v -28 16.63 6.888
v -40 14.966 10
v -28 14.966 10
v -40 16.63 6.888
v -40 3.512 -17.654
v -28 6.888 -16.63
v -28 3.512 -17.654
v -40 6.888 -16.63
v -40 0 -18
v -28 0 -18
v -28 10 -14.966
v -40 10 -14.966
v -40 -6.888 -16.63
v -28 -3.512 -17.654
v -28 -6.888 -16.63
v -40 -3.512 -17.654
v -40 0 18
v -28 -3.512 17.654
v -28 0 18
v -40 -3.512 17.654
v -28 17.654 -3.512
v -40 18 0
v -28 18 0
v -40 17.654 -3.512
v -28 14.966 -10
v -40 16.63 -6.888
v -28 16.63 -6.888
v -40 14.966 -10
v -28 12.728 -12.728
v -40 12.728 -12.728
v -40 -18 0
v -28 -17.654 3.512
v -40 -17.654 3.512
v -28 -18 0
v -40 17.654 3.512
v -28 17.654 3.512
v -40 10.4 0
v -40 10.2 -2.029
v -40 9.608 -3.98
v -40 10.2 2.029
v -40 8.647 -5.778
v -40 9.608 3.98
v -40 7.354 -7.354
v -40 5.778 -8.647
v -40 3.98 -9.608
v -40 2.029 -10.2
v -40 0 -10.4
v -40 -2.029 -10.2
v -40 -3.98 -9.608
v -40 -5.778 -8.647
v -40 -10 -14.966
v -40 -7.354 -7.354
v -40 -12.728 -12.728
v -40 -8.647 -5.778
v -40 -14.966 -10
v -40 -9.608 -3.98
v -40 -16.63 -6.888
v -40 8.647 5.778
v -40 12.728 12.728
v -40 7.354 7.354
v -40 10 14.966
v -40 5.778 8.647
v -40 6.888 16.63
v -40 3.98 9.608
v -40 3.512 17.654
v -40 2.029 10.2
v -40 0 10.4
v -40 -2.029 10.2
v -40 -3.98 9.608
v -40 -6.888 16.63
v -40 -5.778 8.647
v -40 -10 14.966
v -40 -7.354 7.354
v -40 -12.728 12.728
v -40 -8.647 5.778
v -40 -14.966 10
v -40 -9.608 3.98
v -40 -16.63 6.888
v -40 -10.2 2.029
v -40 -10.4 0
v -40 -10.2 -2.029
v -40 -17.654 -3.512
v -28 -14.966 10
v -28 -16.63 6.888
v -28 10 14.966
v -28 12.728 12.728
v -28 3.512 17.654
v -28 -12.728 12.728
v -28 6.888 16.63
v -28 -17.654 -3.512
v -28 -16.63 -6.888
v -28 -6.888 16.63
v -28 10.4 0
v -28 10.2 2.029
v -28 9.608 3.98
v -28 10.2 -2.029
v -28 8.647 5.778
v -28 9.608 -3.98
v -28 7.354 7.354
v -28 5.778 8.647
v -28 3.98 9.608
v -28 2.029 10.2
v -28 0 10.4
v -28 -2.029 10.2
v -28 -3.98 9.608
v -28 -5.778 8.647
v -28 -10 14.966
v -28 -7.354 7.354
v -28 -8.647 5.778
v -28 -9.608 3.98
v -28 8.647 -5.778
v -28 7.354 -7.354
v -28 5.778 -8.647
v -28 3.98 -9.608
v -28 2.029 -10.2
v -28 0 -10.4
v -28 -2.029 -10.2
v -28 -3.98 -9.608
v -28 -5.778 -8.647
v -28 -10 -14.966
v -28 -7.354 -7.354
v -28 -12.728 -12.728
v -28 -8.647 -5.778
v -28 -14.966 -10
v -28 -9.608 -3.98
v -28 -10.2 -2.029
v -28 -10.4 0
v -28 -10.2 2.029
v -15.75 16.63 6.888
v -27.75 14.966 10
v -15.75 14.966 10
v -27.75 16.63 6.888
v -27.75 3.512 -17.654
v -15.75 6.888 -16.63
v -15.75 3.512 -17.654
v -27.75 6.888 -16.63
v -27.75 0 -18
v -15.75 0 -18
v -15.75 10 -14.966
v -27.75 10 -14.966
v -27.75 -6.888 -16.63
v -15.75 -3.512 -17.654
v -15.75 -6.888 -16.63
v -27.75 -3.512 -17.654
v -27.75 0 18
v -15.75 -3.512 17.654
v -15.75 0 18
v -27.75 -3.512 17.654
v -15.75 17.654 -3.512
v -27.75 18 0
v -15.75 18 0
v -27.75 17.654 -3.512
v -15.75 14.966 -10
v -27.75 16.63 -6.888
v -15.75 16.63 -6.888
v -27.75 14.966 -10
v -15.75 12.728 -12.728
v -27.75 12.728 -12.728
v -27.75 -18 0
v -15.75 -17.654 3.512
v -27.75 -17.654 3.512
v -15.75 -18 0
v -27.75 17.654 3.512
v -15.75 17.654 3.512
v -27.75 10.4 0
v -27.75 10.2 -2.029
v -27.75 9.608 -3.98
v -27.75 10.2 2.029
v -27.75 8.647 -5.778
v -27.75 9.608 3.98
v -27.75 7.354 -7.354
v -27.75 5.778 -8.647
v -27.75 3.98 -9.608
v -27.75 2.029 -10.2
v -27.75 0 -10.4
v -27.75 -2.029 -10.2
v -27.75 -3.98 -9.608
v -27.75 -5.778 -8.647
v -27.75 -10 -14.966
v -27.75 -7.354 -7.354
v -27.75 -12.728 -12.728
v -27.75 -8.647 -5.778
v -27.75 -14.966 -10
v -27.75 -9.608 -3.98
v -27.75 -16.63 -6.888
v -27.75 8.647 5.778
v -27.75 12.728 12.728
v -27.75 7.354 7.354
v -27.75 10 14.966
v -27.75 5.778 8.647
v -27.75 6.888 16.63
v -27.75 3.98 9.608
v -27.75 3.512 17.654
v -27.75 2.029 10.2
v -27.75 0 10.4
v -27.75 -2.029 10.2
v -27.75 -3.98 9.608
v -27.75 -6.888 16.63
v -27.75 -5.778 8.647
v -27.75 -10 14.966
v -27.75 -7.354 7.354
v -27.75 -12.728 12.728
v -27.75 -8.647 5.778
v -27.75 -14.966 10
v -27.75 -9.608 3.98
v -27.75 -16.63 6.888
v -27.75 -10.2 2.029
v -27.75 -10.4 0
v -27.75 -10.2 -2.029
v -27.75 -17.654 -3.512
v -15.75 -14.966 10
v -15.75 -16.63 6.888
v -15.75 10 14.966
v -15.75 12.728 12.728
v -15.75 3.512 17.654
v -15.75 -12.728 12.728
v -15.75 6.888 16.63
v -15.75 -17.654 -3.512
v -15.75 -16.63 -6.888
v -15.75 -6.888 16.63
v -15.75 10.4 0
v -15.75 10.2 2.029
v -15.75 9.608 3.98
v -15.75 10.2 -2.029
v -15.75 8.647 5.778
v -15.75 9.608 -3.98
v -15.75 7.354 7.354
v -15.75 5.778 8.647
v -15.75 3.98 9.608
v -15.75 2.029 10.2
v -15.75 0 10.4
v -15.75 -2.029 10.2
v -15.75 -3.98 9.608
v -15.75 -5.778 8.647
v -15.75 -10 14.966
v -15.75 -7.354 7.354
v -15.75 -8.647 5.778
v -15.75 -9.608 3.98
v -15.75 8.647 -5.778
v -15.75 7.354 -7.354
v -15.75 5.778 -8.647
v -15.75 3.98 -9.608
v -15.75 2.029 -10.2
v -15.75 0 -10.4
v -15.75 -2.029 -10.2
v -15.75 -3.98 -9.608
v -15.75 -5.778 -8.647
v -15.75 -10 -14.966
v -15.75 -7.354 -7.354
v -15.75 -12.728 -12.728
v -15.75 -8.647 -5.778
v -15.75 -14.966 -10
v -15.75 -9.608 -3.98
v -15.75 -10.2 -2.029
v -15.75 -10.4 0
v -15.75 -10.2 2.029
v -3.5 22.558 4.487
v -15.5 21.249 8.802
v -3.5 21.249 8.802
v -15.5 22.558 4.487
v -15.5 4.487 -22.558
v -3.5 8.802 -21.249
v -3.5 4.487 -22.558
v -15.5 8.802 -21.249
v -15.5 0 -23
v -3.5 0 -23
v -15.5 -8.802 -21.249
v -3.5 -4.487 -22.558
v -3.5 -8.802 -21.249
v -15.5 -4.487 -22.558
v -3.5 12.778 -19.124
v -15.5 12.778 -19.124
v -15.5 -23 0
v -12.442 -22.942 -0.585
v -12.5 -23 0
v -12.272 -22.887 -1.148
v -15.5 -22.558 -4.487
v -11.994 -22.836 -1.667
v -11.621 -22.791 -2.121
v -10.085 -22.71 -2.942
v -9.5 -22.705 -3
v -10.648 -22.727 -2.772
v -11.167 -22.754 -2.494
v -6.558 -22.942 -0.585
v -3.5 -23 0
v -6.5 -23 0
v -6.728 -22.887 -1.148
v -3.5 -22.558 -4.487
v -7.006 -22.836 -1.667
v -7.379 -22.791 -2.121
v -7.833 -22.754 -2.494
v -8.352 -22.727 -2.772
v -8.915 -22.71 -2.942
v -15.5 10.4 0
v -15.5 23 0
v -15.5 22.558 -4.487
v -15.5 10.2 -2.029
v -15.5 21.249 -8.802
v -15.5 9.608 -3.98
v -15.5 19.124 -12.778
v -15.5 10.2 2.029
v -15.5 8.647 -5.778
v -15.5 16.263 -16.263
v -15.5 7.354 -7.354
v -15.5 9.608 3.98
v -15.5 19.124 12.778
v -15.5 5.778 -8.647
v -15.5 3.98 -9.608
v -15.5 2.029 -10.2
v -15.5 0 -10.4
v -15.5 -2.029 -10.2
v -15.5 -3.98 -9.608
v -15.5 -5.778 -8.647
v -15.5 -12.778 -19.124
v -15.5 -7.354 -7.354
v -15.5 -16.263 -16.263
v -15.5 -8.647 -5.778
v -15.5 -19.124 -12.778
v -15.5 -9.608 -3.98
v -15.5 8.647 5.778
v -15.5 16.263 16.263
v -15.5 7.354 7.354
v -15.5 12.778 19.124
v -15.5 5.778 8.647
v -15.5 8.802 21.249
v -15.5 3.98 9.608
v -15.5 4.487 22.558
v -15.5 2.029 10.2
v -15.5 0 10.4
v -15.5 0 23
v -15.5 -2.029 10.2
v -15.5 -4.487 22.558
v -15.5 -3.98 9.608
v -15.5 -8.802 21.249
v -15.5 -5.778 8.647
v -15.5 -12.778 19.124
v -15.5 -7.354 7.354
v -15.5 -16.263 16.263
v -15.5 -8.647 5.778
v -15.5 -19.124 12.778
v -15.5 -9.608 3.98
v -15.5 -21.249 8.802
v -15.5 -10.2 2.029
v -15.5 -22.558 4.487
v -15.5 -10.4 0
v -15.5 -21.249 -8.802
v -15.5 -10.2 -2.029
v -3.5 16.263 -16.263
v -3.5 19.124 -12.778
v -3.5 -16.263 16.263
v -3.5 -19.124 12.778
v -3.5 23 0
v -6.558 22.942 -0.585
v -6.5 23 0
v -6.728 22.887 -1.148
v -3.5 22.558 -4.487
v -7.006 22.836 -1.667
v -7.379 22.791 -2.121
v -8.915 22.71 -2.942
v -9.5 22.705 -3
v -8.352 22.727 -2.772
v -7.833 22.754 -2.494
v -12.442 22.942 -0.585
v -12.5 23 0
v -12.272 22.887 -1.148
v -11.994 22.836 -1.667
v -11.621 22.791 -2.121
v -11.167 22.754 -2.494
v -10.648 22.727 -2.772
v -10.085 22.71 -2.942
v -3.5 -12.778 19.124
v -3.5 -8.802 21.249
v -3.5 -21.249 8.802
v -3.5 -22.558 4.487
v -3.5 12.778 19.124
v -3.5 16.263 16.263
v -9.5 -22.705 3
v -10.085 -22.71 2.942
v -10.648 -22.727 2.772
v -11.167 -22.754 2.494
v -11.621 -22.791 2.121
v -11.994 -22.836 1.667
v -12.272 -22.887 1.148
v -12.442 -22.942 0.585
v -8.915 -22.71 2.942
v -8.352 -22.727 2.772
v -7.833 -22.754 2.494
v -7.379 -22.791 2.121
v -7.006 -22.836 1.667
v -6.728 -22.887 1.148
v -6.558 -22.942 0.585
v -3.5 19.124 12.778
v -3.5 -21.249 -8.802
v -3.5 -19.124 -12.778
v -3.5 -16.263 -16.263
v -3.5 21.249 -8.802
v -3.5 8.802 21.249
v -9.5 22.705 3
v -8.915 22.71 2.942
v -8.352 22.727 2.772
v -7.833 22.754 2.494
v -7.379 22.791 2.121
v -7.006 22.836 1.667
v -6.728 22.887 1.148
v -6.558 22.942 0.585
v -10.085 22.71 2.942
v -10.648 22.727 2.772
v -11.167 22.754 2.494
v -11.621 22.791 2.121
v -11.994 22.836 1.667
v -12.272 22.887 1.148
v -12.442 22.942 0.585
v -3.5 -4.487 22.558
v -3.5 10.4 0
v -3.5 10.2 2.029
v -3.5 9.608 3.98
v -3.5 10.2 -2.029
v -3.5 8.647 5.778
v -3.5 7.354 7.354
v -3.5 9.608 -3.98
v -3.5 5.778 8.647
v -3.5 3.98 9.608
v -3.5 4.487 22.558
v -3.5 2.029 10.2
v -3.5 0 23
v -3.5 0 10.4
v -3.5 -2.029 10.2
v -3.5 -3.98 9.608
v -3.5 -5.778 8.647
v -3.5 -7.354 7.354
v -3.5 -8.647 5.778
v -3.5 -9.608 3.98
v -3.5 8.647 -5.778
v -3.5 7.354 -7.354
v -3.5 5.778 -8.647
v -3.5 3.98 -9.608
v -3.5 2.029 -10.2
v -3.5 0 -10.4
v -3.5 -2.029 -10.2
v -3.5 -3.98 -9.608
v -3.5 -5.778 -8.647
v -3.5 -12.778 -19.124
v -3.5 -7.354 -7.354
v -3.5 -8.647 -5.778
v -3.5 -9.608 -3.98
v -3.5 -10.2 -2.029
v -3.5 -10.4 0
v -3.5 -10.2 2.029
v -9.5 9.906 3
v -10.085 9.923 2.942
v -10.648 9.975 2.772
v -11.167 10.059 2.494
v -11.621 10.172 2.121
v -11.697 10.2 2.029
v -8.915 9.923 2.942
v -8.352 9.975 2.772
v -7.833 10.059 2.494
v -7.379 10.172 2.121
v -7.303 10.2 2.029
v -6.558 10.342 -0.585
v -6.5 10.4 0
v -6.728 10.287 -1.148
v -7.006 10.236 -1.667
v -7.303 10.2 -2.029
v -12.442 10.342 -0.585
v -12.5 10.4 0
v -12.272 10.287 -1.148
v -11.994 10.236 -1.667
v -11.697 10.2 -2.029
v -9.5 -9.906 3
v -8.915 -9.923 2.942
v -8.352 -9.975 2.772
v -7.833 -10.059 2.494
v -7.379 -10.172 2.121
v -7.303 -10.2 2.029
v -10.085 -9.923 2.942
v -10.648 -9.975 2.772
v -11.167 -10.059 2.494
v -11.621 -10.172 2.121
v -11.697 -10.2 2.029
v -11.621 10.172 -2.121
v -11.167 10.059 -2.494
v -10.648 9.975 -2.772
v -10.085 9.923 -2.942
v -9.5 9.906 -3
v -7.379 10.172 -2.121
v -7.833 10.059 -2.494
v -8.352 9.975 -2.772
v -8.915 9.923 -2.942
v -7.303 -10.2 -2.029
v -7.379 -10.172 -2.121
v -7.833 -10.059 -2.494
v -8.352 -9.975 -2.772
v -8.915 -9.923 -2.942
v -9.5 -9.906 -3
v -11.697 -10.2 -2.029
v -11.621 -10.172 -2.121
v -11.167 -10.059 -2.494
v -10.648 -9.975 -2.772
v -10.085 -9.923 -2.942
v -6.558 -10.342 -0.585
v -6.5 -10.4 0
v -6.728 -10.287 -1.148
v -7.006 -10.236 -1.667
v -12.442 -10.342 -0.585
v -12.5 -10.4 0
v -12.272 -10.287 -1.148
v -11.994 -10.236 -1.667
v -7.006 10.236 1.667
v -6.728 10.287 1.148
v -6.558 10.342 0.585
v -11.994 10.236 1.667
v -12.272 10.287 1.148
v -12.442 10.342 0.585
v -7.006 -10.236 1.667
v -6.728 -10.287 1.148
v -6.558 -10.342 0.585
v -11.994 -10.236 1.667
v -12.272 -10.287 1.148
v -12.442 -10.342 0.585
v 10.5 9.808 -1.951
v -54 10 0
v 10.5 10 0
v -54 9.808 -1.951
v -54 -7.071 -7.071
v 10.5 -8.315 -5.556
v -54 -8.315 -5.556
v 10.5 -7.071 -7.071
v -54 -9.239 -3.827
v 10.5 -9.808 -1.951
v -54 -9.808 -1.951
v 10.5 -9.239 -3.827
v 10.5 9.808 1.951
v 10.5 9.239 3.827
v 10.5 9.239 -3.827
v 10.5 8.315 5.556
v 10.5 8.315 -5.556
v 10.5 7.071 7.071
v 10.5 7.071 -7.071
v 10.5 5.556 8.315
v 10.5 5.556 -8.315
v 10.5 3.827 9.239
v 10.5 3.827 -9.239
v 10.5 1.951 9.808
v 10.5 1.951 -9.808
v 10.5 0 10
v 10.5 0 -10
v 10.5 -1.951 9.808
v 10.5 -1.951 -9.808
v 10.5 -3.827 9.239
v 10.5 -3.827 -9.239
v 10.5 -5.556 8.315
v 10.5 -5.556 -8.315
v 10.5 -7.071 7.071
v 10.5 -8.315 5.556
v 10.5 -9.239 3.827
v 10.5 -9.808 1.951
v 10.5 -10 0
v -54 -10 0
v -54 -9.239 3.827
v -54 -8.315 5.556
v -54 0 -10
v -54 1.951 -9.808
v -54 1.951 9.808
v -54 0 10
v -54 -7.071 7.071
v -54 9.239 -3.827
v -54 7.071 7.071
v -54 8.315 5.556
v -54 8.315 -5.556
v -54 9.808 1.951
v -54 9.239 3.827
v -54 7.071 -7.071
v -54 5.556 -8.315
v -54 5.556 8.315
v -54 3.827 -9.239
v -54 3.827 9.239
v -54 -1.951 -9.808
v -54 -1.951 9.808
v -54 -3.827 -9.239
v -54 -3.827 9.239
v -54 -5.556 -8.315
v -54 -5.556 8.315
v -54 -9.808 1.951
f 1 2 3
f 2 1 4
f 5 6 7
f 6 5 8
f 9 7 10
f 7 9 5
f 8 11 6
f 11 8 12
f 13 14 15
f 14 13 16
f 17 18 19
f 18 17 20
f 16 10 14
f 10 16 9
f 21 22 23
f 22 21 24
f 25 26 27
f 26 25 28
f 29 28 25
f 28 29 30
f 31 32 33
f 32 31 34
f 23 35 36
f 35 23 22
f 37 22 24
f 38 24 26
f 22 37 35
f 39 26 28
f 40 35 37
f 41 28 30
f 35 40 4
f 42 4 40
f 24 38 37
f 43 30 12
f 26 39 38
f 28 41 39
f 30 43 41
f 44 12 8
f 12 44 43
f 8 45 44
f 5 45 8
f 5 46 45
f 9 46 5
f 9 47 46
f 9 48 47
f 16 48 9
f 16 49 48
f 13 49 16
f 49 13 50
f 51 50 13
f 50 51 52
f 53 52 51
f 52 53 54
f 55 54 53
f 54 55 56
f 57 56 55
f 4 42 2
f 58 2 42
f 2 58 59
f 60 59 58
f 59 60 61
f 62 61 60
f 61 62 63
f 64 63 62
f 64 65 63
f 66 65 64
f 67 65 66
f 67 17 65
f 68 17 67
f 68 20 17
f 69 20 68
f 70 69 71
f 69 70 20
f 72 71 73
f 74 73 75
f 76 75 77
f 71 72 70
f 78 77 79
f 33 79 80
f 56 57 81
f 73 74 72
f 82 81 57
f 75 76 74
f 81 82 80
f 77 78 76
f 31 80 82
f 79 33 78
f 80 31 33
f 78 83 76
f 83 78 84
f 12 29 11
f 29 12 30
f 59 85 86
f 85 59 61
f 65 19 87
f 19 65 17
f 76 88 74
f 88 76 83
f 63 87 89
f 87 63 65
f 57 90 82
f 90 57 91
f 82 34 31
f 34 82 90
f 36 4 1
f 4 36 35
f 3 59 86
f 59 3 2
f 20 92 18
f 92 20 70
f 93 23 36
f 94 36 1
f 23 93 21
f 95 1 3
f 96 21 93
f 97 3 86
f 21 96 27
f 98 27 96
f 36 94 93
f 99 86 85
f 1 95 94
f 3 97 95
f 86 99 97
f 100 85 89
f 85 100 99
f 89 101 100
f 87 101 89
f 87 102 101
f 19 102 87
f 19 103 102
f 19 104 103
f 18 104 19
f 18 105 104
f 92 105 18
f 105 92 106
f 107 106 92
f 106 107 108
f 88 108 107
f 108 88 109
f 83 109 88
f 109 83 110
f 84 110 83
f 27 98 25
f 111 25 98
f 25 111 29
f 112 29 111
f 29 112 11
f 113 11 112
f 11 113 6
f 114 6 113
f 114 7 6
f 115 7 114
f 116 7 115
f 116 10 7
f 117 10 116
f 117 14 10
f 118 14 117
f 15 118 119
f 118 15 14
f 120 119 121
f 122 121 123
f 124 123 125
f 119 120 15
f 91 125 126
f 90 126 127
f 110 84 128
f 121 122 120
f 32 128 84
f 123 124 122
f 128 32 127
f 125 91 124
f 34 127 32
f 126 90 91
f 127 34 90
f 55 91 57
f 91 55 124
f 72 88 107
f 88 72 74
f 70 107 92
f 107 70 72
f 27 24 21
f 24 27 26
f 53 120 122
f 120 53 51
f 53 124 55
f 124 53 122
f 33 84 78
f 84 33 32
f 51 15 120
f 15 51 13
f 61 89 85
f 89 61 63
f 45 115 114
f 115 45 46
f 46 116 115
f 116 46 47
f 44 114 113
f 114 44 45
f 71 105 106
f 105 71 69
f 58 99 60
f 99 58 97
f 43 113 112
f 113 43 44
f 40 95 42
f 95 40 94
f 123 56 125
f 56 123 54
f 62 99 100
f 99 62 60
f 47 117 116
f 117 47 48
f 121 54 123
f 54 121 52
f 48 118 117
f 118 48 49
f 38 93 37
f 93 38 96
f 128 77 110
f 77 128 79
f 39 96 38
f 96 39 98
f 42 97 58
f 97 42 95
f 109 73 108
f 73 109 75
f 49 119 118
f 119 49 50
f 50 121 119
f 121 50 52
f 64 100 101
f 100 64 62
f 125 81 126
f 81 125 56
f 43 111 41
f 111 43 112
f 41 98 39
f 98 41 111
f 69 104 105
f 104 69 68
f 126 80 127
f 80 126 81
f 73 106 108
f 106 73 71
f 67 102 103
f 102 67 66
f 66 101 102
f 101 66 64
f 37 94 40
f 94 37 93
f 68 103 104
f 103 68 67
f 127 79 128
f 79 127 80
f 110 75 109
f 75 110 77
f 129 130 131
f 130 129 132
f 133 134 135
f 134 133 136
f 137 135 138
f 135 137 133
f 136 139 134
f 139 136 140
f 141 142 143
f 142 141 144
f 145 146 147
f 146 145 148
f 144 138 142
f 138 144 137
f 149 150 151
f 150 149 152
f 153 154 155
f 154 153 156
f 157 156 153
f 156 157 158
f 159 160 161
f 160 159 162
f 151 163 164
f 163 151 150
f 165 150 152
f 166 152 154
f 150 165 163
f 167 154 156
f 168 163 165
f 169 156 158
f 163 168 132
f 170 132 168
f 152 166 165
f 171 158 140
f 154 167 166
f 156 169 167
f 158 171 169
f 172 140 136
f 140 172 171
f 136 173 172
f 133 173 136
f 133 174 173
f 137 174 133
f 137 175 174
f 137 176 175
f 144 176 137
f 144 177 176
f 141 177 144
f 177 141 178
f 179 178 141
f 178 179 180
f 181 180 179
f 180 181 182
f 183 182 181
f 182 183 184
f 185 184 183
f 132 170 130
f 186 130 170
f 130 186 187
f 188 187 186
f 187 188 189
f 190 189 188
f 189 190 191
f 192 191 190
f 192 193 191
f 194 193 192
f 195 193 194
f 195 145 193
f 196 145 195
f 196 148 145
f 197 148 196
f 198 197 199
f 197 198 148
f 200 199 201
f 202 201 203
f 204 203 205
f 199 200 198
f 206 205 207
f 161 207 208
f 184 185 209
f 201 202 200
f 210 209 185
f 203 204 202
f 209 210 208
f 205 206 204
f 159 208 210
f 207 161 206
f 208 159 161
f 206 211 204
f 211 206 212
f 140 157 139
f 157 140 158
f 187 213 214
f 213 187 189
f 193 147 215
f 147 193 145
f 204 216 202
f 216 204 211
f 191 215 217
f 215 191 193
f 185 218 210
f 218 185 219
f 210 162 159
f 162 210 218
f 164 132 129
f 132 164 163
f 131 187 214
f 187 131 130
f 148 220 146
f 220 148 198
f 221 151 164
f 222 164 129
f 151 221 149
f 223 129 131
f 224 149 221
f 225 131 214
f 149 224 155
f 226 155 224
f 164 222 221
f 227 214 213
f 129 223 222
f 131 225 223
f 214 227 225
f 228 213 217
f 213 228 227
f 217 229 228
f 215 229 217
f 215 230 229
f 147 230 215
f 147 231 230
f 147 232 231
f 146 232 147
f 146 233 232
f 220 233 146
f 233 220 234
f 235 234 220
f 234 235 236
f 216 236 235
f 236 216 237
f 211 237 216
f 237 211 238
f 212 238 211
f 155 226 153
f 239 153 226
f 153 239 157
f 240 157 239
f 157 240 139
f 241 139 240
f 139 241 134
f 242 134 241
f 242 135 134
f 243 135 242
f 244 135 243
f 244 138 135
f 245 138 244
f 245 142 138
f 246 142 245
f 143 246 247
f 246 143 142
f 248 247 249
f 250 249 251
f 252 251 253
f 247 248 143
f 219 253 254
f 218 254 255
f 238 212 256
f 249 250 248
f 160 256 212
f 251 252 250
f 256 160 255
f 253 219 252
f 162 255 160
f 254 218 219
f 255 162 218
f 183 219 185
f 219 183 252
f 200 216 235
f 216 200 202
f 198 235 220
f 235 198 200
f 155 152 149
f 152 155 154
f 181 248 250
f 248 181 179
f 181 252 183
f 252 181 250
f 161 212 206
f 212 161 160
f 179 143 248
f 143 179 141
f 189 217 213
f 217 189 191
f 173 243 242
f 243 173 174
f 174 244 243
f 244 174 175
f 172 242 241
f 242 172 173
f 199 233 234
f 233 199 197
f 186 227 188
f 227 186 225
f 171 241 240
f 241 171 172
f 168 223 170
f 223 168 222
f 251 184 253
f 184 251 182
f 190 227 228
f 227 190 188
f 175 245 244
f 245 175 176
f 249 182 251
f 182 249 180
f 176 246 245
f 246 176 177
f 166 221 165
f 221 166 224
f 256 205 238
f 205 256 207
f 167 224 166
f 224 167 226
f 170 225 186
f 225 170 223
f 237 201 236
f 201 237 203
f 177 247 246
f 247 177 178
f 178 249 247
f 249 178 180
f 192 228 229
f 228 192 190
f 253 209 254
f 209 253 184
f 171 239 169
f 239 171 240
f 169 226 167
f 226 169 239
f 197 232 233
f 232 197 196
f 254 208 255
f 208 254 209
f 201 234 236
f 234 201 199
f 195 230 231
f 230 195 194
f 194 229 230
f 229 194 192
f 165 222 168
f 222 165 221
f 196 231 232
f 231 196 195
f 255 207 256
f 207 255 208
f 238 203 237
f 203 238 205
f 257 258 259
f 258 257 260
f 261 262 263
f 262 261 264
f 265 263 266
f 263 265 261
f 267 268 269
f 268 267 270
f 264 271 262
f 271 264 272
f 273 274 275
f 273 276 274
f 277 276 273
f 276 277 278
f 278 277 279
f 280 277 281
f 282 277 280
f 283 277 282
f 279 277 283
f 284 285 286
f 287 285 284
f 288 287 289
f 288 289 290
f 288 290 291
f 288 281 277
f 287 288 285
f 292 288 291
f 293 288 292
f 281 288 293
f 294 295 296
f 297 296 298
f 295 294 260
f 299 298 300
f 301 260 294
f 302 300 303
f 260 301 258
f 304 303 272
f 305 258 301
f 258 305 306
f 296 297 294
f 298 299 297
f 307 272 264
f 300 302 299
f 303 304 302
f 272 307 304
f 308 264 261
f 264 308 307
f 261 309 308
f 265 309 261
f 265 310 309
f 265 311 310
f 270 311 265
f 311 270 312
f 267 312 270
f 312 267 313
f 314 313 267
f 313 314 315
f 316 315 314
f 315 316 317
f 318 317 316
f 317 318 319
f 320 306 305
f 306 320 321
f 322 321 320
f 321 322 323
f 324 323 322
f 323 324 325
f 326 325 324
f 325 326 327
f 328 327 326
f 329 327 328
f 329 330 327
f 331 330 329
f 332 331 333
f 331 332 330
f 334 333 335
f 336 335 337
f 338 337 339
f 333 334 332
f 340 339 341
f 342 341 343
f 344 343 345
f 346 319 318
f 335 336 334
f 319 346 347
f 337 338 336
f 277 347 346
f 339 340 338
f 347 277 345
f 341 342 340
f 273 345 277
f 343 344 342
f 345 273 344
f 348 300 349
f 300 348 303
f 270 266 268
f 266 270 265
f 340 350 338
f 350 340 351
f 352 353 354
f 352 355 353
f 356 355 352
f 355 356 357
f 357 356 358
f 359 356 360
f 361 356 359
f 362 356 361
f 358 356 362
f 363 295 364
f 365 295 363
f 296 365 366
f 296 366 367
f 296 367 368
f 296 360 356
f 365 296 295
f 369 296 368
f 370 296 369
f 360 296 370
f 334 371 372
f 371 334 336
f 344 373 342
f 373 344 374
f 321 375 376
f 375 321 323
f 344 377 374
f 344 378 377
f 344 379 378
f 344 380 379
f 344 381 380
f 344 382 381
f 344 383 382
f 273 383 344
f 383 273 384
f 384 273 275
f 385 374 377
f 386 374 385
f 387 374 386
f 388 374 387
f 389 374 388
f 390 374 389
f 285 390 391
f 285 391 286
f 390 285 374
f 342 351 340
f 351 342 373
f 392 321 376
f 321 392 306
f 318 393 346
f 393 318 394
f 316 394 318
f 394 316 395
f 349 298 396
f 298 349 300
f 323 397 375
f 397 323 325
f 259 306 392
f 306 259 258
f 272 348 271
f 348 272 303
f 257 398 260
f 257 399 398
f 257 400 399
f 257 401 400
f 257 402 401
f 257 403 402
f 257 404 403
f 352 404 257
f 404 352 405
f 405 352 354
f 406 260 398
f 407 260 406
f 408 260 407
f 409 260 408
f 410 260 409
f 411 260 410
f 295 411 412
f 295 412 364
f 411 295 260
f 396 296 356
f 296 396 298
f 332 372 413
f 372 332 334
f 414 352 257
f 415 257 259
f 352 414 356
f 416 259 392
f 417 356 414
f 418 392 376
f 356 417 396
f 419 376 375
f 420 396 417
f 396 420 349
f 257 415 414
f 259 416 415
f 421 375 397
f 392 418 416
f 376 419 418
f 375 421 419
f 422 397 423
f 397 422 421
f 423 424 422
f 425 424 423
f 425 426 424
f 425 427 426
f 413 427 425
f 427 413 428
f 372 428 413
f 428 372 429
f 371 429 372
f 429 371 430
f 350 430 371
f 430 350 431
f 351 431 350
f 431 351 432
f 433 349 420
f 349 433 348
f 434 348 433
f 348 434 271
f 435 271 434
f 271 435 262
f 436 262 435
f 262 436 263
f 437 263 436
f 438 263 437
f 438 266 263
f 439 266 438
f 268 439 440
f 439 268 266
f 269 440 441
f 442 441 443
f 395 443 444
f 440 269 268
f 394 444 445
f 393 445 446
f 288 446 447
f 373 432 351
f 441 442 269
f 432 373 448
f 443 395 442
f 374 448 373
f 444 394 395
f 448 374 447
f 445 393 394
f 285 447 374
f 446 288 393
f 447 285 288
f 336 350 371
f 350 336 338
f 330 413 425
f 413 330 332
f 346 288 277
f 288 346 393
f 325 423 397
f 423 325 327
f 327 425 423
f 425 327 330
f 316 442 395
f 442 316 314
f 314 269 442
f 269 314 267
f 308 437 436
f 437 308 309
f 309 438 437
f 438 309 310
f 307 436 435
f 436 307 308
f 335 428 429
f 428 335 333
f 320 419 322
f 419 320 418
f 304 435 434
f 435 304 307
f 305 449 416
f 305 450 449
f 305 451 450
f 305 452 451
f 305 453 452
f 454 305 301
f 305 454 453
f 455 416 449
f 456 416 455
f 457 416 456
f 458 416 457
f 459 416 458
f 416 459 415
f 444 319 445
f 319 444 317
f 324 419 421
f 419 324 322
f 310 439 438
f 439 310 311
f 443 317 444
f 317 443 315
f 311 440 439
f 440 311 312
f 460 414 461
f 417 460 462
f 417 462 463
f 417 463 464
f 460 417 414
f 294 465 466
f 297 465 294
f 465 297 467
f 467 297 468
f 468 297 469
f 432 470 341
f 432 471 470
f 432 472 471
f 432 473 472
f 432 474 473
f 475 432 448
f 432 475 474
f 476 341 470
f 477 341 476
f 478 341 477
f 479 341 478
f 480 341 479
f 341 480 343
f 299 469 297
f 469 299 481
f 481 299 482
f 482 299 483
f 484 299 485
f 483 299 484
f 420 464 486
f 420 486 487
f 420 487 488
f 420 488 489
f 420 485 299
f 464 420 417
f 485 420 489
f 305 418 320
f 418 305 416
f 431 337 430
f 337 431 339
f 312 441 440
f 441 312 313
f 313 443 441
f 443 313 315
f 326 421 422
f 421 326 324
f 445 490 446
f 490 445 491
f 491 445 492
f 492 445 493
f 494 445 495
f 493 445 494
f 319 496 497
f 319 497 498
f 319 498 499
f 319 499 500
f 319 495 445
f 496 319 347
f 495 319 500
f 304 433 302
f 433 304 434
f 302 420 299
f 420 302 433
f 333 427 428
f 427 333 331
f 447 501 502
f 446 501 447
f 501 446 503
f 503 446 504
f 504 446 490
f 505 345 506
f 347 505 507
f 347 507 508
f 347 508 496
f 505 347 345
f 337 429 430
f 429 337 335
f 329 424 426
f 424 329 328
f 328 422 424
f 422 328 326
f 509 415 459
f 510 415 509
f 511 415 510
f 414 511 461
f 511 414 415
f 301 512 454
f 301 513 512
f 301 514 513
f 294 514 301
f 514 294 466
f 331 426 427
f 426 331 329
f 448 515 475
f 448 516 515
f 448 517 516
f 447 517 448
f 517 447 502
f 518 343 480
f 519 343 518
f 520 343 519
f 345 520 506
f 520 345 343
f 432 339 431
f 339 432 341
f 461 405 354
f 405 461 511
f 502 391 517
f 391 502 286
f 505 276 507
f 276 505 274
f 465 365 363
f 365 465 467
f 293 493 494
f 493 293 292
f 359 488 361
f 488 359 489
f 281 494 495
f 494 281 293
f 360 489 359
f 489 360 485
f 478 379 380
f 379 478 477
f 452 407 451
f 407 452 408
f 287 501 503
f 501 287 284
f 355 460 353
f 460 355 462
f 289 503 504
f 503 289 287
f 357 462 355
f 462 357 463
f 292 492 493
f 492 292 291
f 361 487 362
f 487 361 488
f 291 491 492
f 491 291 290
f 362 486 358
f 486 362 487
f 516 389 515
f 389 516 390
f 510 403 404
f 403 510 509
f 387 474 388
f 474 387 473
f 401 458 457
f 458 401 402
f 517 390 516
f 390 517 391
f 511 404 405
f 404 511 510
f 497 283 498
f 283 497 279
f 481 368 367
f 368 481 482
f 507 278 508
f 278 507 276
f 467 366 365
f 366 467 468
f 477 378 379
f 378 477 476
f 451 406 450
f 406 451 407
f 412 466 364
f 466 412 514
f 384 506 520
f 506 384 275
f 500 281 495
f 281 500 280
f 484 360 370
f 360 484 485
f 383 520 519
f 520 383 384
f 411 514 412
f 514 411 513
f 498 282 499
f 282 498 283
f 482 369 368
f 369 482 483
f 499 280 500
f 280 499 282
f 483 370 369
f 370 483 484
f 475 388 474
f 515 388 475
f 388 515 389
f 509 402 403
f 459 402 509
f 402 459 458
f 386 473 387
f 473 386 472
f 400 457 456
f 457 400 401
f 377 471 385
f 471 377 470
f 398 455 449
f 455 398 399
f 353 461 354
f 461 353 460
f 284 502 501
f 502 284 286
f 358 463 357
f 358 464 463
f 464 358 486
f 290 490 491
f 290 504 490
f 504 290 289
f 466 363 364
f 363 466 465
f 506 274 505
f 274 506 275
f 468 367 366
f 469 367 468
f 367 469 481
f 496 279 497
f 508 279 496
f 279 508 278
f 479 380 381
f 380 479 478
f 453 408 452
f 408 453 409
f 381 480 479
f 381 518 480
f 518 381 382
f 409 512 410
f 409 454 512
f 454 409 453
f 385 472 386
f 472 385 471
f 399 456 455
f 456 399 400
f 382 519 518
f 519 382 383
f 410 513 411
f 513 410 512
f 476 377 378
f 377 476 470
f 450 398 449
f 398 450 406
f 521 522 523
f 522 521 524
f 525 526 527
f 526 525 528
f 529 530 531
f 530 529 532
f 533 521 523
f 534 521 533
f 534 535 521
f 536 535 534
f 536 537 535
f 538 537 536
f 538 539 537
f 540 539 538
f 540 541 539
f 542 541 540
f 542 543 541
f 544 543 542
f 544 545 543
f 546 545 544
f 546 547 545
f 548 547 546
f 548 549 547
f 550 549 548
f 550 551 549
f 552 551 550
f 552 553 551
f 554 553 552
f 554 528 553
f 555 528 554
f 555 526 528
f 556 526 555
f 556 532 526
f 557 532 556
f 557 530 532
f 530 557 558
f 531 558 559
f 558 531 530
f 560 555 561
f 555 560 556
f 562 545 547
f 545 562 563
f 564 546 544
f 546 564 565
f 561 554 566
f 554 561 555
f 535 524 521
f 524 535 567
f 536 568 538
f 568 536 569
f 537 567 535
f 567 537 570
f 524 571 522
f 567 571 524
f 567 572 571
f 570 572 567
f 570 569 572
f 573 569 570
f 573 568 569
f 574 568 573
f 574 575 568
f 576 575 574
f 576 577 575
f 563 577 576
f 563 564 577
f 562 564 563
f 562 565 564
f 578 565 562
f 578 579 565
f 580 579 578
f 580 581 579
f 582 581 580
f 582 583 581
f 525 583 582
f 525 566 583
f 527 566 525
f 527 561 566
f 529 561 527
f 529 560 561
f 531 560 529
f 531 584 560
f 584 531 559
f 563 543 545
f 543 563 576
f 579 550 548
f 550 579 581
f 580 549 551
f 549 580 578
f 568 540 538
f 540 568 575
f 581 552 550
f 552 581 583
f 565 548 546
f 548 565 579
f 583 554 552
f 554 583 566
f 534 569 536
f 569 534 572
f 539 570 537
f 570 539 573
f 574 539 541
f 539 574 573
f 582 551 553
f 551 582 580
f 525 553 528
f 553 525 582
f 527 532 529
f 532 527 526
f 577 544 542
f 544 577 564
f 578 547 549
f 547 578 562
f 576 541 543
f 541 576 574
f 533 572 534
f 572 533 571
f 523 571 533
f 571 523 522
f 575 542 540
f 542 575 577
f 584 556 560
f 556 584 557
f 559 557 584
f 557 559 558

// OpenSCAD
$fn = 32;

// ------------------------------------------------------------------------
// Shaft with rings and collars: d20 shaft, 3 rings
// Every part is its own module, assembly() places them once.
// ------------------------------------------------------------------------

// --- part 1 ---
module shaft() {
  translate([0, 0, -32.25]) cylinder(h = 64.5, d = 20);
}

// --- part 2 ---
module spacer_a() {
  difference() {
      translate([0, 0, 0]) cylinder(h = 12, d = 36);
      translate([0, 0, -1]) cylinder(h = 14, d = 20.8);
    }
}

// --- part 3 ---
module spacer_b() {
  difference() {
      translate([0, 0, 0]) cylinder(h = 12, d = 36);
      translate([0, 0, -1]) cylinder(h = 14, d = 20.8);
    }
}

// --- part 4 ---
module collar_a() {
  difference() {
    cylinder(h = 12, d = 46);
    translate([0, 0, -1]) cylinder(h = 14, d = 20.8);
    translate([0, 0, 6]) rotate([90, 0, 0]) cylinder(h = 48, d = 6, center = true);
  }
}

// --- assembly ---
module assembly() {
  translate([-21.75, 0, 0]) rotate([0, 90, 0]) shaft();
  translate([-40, 0, 0]) rotate([0, 90, 0]) spacer_a();
  translate([-27.75, 0, 0]) rotate([0, 90, 0]) spacer_b();
  translate([-15.5, 0, 0]) rotate([0, 90, 0]) collar_a();
}

assembly();
